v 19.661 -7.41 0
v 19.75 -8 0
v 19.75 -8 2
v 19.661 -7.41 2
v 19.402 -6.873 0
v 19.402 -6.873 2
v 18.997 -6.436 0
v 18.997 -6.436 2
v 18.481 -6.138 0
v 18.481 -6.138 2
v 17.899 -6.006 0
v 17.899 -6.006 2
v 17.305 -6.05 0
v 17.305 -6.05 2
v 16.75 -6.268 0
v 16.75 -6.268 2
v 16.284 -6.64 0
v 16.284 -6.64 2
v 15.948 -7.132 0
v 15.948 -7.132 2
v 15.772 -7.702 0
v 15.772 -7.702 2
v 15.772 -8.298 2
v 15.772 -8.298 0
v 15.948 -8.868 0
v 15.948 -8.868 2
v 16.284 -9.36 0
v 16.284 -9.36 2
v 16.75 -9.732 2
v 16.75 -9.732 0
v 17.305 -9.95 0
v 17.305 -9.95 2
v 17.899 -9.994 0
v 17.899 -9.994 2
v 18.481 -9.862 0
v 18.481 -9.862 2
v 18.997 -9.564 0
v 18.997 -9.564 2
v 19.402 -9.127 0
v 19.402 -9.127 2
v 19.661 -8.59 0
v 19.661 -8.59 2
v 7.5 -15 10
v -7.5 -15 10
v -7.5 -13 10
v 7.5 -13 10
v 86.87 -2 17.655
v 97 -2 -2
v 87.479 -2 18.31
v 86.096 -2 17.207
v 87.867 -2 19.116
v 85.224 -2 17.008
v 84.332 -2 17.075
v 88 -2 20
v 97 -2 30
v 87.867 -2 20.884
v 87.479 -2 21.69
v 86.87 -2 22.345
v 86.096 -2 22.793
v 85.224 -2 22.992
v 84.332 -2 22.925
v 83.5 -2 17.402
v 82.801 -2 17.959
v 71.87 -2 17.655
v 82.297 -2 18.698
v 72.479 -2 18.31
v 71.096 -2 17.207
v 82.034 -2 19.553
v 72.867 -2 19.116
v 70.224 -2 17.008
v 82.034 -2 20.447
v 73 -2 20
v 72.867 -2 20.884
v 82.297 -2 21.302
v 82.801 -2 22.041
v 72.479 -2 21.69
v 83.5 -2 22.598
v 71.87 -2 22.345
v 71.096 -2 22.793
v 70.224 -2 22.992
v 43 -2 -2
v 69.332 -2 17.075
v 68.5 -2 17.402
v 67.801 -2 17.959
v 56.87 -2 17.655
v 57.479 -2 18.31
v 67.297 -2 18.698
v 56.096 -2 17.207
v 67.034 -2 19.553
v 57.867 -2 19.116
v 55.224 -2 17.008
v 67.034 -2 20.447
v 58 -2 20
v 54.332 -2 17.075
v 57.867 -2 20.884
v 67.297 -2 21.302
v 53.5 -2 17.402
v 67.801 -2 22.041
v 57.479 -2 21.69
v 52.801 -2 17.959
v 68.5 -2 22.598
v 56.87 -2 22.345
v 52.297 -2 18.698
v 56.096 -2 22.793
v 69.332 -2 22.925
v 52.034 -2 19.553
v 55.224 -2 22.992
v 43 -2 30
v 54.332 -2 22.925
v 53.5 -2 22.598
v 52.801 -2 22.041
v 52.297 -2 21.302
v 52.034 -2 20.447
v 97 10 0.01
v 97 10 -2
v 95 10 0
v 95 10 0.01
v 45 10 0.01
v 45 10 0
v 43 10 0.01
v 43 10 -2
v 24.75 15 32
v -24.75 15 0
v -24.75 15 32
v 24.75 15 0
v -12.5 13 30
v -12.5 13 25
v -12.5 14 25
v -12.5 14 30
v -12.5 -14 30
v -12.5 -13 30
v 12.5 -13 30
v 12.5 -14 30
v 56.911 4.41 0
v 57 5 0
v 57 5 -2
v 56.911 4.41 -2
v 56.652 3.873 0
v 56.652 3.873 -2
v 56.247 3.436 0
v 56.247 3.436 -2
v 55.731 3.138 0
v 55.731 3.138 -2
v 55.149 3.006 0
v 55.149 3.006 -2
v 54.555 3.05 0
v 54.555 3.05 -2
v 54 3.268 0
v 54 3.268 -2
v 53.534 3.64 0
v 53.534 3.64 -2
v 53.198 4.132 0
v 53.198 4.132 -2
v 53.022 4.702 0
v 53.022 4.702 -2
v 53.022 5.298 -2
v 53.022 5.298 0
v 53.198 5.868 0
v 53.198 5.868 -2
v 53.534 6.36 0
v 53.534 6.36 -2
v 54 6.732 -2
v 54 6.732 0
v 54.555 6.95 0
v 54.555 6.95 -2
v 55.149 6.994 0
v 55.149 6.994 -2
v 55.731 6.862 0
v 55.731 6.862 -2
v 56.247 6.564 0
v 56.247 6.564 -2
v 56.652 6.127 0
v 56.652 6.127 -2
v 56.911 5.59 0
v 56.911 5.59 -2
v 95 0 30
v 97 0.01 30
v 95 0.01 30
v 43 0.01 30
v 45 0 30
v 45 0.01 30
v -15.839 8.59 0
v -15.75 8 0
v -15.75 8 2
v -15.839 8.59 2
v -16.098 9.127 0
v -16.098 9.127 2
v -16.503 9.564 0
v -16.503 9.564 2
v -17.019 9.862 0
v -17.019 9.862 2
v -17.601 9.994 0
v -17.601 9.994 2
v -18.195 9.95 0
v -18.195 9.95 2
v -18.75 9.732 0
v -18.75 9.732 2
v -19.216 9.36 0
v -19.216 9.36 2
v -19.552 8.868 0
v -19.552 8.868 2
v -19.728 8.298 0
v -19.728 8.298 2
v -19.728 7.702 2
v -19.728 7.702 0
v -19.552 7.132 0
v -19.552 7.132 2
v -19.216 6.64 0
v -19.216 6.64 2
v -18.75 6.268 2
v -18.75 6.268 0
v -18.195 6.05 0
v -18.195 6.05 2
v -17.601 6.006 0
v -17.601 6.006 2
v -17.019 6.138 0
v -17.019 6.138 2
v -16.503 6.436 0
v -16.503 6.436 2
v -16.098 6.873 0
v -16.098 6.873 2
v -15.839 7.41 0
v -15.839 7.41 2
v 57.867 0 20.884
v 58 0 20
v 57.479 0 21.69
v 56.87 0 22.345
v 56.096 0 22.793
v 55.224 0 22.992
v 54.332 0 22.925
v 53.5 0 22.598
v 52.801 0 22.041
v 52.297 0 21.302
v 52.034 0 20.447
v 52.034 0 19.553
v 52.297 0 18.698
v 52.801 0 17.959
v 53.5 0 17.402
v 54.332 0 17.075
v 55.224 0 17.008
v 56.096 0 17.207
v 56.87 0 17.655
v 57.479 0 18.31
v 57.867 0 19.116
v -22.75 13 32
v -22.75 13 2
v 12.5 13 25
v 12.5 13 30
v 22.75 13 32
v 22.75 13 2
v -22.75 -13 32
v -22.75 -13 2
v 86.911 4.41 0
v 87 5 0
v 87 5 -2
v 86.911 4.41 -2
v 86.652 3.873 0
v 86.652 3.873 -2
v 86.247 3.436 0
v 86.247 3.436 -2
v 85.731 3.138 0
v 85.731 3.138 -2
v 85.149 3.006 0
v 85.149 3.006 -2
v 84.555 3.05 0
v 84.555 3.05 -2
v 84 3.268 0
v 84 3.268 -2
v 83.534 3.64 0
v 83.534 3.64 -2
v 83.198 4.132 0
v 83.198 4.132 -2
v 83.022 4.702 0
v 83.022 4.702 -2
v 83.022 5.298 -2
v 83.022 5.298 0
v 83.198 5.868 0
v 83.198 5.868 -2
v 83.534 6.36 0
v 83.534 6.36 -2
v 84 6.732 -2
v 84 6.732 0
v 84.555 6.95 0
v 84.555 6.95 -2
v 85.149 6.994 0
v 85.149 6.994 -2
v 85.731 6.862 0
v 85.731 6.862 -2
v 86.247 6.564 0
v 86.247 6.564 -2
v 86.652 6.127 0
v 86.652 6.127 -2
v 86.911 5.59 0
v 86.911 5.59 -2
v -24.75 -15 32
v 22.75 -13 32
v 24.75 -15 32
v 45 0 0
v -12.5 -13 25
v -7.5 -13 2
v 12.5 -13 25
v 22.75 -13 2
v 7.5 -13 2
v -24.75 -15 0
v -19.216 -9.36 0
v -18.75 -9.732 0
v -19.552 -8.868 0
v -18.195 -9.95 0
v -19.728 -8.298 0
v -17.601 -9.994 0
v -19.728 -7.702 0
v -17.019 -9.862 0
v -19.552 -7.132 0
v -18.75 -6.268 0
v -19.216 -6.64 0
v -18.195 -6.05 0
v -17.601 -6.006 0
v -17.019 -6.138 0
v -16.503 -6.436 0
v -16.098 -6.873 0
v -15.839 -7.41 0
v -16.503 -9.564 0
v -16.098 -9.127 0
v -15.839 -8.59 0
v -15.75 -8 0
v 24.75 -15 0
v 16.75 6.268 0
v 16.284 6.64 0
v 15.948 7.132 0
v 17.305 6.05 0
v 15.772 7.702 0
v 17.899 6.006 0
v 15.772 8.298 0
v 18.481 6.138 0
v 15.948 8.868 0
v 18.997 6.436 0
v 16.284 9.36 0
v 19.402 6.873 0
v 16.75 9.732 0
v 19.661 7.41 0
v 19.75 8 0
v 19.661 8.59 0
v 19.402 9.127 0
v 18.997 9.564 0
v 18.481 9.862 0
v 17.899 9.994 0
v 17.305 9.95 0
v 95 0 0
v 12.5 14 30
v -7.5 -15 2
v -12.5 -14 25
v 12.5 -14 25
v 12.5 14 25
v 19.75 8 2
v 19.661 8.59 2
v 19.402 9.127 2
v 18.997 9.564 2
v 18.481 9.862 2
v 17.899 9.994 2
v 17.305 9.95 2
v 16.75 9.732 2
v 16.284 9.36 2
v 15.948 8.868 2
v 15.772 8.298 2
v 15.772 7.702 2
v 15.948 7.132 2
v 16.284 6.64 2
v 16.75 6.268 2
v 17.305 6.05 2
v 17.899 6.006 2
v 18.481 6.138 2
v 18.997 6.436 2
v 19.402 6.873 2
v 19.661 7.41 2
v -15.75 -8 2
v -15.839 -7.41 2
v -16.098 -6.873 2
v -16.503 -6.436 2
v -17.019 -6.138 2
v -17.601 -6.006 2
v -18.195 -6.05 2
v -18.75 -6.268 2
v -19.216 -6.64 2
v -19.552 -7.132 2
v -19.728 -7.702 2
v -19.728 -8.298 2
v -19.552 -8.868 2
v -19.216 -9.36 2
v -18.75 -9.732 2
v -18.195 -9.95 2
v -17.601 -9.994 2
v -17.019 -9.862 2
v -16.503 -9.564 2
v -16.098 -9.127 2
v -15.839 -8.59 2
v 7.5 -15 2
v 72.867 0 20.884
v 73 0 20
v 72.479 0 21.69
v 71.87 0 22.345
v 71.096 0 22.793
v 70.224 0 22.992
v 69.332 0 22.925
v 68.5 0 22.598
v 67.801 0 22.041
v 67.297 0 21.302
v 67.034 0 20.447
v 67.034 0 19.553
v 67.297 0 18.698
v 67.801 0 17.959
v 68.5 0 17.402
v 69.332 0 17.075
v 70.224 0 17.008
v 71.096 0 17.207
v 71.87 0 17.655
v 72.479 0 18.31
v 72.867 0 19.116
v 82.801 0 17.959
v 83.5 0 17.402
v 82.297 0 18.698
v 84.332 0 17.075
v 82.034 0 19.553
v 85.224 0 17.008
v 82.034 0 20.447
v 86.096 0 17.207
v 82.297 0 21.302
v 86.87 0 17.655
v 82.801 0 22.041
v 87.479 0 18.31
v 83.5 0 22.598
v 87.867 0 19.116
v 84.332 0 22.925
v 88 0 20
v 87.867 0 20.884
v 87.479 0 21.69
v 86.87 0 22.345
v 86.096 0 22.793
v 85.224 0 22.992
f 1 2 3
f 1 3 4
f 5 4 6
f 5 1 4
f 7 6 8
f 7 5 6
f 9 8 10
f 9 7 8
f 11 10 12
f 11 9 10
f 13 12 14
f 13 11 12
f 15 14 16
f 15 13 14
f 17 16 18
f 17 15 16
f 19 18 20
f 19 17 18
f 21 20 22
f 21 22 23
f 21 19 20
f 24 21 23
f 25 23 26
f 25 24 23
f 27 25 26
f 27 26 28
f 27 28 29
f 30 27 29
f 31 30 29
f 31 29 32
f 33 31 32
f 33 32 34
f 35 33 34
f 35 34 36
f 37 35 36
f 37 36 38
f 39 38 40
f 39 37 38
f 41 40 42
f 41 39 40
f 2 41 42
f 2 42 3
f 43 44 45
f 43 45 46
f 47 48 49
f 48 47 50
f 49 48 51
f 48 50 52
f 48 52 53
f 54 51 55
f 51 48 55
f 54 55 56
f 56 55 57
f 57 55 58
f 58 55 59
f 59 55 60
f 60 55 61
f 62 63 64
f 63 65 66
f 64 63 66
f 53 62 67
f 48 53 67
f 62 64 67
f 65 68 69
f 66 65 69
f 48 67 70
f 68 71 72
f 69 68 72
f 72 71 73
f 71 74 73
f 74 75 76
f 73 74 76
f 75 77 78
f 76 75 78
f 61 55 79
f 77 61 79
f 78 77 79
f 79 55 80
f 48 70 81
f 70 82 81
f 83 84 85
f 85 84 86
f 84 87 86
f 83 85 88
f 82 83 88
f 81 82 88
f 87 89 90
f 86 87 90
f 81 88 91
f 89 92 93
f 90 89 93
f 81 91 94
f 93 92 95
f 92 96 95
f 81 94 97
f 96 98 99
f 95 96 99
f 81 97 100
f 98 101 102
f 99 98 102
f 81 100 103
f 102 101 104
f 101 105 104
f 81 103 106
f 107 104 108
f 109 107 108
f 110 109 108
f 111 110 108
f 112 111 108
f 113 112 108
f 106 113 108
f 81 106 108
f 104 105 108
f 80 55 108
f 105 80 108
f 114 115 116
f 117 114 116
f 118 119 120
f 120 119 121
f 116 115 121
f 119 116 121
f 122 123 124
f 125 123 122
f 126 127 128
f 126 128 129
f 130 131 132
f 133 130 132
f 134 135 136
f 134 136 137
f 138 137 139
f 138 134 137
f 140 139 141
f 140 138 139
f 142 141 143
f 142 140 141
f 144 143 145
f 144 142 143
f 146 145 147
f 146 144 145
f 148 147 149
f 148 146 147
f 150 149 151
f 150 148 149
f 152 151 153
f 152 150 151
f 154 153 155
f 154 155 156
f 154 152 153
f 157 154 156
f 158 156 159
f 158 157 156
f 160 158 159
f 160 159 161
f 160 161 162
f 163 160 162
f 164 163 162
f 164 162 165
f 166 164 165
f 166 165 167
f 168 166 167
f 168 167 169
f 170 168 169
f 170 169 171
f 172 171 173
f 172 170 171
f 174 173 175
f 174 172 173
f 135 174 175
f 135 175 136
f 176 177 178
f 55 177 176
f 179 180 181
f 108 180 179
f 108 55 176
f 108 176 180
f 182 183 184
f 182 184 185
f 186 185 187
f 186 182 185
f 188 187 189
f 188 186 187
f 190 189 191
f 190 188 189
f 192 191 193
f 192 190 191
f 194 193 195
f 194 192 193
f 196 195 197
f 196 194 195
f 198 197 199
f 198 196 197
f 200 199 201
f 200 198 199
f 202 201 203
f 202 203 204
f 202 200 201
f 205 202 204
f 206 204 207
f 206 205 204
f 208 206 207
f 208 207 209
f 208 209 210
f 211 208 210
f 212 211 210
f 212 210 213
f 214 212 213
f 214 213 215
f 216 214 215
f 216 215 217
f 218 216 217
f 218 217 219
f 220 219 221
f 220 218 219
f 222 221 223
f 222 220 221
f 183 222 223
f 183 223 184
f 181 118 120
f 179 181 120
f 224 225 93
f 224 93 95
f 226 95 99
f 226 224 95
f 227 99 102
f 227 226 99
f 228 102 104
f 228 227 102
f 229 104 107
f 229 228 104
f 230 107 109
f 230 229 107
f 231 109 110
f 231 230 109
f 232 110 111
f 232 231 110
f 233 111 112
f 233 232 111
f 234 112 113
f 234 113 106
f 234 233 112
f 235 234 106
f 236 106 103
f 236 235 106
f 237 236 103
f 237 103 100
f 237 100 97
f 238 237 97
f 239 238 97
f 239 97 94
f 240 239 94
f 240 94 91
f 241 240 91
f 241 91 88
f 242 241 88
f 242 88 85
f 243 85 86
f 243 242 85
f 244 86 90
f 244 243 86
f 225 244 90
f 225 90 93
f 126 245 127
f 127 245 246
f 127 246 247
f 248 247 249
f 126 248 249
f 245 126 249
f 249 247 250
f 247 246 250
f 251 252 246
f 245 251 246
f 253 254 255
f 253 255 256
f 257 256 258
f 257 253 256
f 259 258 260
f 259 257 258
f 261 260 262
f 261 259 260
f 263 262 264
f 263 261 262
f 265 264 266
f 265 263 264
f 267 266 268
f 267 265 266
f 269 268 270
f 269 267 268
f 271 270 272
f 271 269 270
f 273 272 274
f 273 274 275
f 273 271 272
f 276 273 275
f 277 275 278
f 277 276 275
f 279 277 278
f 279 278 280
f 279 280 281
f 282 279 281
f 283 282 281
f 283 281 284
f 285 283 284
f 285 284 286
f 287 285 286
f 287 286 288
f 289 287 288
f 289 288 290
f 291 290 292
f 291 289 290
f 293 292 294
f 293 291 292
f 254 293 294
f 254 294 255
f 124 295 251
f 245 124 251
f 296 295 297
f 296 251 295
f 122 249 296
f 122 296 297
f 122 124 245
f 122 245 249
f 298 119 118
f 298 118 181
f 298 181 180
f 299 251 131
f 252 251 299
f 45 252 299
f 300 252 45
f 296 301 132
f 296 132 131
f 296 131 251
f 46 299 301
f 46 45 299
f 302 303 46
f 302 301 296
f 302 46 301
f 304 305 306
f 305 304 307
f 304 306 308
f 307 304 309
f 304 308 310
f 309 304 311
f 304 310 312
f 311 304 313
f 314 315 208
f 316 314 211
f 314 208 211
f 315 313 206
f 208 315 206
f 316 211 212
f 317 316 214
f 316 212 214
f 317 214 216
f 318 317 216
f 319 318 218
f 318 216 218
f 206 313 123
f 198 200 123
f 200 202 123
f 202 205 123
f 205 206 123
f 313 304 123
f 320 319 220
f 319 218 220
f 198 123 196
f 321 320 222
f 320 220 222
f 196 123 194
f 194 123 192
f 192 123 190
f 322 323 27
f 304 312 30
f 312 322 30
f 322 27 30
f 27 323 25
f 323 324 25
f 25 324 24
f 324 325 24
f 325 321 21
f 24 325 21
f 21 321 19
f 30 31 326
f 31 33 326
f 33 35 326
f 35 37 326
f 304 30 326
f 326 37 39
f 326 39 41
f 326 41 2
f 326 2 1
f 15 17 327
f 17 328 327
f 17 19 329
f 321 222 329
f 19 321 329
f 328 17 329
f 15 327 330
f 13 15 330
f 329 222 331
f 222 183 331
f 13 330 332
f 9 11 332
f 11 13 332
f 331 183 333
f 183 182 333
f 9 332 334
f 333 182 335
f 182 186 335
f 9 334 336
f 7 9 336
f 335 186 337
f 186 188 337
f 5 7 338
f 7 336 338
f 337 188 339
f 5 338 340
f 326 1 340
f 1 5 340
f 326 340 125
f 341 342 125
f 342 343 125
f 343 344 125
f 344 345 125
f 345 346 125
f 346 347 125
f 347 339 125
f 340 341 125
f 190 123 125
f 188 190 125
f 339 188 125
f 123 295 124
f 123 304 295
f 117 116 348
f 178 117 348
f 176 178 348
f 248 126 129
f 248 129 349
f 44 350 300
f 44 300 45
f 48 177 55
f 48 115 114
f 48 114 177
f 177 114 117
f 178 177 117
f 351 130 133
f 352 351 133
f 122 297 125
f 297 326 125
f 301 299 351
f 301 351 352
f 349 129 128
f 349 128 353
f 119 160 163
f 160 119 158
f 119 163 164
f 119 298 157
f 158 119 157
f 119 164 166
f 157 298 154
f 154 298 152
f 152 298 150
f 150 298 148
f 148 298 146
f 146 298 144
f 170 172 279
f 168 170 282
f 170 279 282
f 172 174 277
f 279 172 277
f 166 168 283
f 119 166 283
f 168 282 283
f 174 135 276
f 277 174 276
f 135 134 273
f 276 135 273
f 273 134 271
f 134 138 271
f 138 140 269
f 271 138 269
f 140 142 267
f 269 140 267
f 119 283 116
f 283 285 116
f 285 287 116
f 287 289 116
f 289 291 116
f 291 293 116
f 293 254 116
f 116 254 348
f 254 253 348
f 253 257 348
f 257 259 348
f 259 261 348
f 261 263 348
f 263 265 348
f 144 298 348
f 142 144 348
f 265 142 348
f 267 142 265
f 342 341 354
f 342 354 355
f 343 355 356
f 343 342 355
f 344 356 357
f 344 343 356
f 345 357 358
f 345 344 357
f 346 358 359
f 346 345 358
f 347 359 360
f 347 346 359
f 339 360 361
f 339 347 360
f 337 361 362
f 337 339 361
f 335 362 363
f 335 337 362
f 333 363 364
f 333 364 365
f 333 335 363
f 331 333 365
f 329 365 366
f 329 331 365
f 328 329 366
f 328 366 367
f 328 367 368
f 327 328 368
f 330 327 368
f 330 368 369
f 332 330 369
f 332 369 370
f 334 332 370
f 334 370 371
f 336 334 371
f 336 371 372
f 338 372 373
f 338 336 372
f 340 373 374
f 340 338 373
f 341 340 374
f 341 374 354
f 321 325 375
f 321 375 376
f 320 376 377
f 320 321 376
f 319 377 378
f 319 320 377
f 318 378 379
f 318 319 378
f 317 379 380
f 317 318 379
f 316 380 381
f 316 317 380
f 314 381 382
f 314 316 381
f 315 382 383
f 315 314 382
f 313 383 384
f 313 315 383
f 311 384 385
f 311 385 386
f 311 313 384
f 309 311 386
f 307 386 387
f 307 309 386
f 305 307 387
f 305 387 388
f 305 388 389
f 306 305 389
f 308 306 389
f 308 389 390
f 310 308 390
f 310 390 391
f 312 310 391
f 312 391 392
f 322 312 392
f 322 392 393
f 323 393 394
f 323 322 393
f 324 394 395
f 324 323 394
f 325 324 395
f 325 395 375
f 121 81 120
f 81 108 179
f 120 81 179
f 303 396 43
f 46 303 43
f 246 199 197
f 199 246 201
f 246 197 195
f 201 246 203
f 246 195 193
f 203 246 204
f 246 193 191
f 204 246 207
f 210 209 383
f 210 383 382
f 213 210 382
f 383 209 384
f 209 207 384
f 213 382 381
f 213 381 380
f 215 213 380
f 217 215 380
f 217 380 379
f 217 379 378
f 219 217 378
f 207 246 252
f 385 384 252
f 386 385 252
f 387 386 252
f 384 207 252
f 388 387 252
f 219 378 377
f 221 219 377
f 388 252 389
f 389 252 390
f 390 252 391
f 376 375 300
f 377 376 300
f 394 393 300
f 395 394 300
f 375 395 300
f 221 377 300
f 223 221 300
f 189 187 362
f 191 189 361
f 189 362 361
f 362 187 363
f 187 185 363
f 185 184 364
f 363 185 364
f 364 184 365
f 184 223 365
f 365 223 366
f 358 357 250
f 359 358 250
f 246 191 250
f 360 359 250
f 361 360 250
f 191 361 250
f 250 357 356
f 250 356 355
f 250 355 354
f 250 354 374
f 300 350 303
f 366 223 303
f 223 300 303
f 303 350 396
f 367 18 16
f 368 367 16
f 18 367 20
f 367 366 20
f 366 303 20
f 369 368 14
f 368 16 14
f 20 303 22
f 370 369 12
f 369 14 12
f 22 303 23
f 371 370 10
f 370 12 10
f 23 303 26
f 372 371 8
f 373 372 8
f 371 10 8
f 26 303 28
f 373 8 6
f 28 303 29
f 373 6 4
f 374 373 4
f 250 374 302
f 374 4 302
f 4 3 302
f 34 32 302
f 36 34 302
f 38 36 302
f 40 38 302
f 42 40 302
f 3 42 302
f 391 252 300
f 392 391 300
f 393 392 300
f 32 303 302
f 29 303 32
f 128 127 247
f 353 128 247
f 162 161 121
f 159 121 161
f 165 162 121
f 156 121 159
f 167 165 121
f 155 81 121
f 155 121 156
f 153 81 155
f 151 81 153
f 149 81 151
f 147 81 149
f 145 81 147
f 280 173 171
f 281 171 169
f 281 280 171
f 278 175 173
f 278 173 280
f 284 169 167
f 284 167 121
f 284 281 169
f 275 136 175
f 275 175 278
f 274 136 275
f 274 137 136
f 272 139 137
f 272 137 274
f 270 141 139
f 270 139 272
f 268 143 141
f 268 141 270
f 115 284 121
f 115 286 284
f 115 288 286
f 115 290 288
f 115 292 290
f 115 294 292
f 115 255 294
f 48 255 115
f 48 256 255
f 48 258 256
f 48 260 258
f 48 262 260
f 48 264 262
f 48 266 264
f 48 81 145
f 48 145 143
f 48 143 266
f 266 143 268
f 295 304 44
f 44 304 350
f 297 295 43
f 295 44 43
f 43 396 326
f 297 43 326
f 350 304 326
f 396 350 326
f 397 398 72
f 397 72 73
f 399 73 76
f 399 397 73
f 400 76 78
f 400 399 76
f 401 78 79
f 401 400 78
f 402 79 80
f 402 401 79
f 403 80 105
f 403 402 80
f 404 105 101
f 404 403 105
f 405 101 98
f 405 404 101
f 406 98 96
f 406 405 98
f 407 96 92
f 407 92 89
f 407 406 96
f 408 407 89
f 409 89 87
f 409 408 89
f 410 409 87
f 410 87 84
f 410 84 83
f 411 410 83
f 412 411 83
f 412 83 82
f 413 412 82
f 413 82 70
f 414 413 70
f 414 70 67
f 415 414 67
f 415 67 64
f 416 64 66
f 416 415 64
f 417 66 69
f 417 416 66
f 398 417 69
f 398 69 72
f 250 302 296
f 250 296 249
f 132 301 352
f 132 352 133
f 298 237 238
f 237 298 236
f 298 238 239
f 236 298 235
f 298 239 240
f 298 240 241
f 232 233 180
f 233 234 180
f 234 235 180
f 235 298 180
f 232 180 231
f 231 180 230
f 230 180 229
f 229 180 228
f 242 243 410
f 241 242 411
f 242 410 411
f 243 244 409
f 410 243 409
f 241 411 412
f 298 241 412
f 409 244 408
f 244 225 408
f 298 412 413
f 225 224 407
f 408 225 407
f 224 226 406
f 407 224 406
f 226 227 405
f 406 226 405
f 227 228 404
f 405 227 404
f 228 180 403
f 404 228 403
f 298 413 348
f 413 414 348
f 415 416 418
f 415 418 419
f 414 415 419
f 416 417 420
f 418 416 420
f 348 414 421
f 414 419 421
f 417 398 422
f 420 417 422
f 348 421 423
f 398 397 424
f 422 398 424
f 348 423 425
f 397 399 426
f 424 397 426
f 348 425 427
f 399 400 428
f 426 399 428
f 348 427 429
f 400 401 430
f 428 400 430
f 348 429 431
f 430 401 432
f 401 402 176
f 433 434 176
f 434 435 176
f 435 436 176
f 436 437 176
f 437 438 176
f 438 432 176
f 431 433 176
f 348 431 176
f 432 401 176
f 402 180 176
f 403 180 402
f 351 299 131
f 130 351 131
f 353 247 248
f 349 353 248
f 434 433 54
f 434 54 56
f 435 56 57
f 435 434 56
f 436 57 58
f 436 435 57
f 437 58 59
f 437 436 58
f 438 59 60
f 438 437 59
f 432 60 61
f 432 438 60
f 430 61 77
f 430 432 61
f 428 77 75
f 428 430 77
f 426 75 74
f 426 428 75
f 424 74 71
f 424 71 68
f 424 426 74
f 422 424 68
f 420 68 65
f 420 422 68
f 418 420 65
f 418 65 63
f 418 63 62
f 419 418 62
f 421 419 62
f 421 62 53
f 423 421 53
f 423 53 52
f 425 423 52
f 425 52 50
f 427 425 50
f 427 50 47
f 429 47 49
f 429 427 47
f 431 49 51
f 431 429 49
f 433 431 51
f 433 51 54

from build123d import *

# Parameters (mm, degrees)
SKETCH_W        = 49.5
SKETCH_H        = 30
SKETCH_R        = 2
PAD_DEPTH       = 2
SKETCH001_W     = 49.5
SKETCH001_H     = 30
SKETCH001_W_2   = 45.5
SKETCH001_H_2   = 26
PAD001_DEPTH    = 30
SKETCH002_W     = 25
SKETCH002_H     = 5
POCKET_DEPTH    = 1
SKETCH003_W     = 15
SKETCH003_H     = 8
POCKET001_DEPTH = 2
SKETCH004_W     = 54
SKETCH004_H     = 30
SKETCH004_R     = 3
PAD002_DEPTH    = 2
SKETCH005_R     = 2
PAD003_DEPTH    = 2
SKETCH006_W     = 2
SKETCH006_H     = 10
PAD004_DEPTH    = 30
CHAMFER_1_SIZE2 = 29.99
CHAMFER_1_SIZE  = 9.99
CHAMFER_2_SIZE2 = 29.99
CHAMFER_2_SIZE  = 9.99


with BuildPart() as body:
    # Sketch → Pad (new body)
    with BuildSketch(Plane.XY):
        Rectangle(SKETCH_W, SKETCH_H)
        with Locations((-17.75, 8)):
            Circle(SKETCH_R, mode=Mode.SUBTRACT)
        with Locations((17.75, 8)):
            Circle(SKETCH_R, mode=Mode.SUBTRACT)
        with Locations((-17.75, -8)):
            Circle(SKETCH_R, mode=Mode.SUBTRACT)
        with Locations((17.75, -8)):
            Circle(SKETCH_R, mode=Mode.SUBTRACT)
    extrude(amount=PAD_DEPTH)

    # Sketch001 (on Face10 of Pad) → Pad001 (join)
    with BuildSketch(Plane.XY.offset(2)):
        Rectangle(SKETCH001_W, SKETCH001_H)
        Rectangle(SKETCH001_W_2, SKETCH001_H_2, mode=Mode.SUBTRACT)
    extrude(amount=PAD001_DEPTH)

    # Sketch002 (on Face19 of Pad001) → Pocket (cut)
    with BuildSketch(Plane.XZ.offset(-13)):
        with Locations((0, 27.5)):
            Rectangle(SKETCH002_W, SKETCH002_H)
    pocket = extrude(amount=-POCKET_DEPTH, mode=Mode.SUBTRACT)

    # Mirrored: Pocket across XZ
    add(pocket.mirror(Plane.XZ), mode=Mode.SUBTRACT)

    # Sketch003 (on Face14 of Mirrored) → Pocket001 (cut)
    with BuildSketch(Plane.XZ.offset(15)):
        with Locations((0, 6)):
            Rectangle(SKETCH003_W, SKETCH003_H)
    extrude(amount=-POCKET001_DEPTH, mode=Mode.SUBTRACT)


with BuildPart() as body001:
    # Sketch004 → Pad002 (new body)
    with BuildSketch(Plane.XZ):
        with Locations((70, 15)):
            Rectangle(SKETCH004_W, SKETCH004_H)
        with Locations((55, 20)):
            Circle(SKETCH004_R, mode=Mode.SUBTRACT)
        with Locations((70, 20)):
            Circle(SKETCH004_R, mode=Mode.SUBTRACT)
        with Locations((85, 20)):
            Circle(SKETCH004_R, mode=Mode.SUBTRACT)
    extrude(amount=PAD002_DEPTH)

    # Sketch005 (on Face3 of Pad002) → Pad003 (join)
    with BuildSketch(Plane(origin=(0, 0, 0), x_dir=(1, 0, 0), z_dir=(0, 0, -1))):
        Polygon((43, -10), (97, -10), (97, 0), (97, 2), (43, 2), (43, 0), align=None)
        with Locations((55, -5)):
            Circle(SKETCH005_R, mode=Mode.SUBTRACT)
        with Locations((85, -5)):
            Circle(SKETCH005_R, mode=Mode.SUBTRACT)
    extrude(amount=PAD003_DEPTH)

    # Sketch006 (on Face8 of Pad003) → Pad004 (join)
    with BuildSketch(Plane(origin=(0, 0, 0), x_dir=(-1, 0, 0), z_dir=(0, 0, 1))):
        with Locations((-96, -5)):
            Rectangle(SKETCH006_W, SKETCH006_H)
        with Locations((-44, -5)):
            Rectangle(SKETCH006_W, SKETCH006_H)
    extrude(amount=PAD004_DEPTH)

    # Chamfer 1
    chamfer_1_edges = [body001.edges().sort_by_distance(p)[0] for p in [
        (96, 10, 30),
    ]]
    chamfer_1_side = body001.faces().sort_by_distance((96, 5, 30))[0]
    chamfer(chamfer_1_edges, length=CHAMFER_1_SIZE, length2=CHAMFER_1_SIZE2, reference=chamfer_1_side)

    # Chamfer 2
    chamfer_2_edges = [body001.edges().sort_by_distance(p)[0] for p in [
        (44, 10, 30),
    ]]
    chamfer_2_side = body001.faces().sort_by_distance((44, 5, 30))[0]
    chamfer(chamfer_2_edges, length=CHAMFER_2_SIZE, length2=CHAMFER_2_SIZE2, reference=chamfer_2_side)


solid = Compound([body.part, body001.part])
